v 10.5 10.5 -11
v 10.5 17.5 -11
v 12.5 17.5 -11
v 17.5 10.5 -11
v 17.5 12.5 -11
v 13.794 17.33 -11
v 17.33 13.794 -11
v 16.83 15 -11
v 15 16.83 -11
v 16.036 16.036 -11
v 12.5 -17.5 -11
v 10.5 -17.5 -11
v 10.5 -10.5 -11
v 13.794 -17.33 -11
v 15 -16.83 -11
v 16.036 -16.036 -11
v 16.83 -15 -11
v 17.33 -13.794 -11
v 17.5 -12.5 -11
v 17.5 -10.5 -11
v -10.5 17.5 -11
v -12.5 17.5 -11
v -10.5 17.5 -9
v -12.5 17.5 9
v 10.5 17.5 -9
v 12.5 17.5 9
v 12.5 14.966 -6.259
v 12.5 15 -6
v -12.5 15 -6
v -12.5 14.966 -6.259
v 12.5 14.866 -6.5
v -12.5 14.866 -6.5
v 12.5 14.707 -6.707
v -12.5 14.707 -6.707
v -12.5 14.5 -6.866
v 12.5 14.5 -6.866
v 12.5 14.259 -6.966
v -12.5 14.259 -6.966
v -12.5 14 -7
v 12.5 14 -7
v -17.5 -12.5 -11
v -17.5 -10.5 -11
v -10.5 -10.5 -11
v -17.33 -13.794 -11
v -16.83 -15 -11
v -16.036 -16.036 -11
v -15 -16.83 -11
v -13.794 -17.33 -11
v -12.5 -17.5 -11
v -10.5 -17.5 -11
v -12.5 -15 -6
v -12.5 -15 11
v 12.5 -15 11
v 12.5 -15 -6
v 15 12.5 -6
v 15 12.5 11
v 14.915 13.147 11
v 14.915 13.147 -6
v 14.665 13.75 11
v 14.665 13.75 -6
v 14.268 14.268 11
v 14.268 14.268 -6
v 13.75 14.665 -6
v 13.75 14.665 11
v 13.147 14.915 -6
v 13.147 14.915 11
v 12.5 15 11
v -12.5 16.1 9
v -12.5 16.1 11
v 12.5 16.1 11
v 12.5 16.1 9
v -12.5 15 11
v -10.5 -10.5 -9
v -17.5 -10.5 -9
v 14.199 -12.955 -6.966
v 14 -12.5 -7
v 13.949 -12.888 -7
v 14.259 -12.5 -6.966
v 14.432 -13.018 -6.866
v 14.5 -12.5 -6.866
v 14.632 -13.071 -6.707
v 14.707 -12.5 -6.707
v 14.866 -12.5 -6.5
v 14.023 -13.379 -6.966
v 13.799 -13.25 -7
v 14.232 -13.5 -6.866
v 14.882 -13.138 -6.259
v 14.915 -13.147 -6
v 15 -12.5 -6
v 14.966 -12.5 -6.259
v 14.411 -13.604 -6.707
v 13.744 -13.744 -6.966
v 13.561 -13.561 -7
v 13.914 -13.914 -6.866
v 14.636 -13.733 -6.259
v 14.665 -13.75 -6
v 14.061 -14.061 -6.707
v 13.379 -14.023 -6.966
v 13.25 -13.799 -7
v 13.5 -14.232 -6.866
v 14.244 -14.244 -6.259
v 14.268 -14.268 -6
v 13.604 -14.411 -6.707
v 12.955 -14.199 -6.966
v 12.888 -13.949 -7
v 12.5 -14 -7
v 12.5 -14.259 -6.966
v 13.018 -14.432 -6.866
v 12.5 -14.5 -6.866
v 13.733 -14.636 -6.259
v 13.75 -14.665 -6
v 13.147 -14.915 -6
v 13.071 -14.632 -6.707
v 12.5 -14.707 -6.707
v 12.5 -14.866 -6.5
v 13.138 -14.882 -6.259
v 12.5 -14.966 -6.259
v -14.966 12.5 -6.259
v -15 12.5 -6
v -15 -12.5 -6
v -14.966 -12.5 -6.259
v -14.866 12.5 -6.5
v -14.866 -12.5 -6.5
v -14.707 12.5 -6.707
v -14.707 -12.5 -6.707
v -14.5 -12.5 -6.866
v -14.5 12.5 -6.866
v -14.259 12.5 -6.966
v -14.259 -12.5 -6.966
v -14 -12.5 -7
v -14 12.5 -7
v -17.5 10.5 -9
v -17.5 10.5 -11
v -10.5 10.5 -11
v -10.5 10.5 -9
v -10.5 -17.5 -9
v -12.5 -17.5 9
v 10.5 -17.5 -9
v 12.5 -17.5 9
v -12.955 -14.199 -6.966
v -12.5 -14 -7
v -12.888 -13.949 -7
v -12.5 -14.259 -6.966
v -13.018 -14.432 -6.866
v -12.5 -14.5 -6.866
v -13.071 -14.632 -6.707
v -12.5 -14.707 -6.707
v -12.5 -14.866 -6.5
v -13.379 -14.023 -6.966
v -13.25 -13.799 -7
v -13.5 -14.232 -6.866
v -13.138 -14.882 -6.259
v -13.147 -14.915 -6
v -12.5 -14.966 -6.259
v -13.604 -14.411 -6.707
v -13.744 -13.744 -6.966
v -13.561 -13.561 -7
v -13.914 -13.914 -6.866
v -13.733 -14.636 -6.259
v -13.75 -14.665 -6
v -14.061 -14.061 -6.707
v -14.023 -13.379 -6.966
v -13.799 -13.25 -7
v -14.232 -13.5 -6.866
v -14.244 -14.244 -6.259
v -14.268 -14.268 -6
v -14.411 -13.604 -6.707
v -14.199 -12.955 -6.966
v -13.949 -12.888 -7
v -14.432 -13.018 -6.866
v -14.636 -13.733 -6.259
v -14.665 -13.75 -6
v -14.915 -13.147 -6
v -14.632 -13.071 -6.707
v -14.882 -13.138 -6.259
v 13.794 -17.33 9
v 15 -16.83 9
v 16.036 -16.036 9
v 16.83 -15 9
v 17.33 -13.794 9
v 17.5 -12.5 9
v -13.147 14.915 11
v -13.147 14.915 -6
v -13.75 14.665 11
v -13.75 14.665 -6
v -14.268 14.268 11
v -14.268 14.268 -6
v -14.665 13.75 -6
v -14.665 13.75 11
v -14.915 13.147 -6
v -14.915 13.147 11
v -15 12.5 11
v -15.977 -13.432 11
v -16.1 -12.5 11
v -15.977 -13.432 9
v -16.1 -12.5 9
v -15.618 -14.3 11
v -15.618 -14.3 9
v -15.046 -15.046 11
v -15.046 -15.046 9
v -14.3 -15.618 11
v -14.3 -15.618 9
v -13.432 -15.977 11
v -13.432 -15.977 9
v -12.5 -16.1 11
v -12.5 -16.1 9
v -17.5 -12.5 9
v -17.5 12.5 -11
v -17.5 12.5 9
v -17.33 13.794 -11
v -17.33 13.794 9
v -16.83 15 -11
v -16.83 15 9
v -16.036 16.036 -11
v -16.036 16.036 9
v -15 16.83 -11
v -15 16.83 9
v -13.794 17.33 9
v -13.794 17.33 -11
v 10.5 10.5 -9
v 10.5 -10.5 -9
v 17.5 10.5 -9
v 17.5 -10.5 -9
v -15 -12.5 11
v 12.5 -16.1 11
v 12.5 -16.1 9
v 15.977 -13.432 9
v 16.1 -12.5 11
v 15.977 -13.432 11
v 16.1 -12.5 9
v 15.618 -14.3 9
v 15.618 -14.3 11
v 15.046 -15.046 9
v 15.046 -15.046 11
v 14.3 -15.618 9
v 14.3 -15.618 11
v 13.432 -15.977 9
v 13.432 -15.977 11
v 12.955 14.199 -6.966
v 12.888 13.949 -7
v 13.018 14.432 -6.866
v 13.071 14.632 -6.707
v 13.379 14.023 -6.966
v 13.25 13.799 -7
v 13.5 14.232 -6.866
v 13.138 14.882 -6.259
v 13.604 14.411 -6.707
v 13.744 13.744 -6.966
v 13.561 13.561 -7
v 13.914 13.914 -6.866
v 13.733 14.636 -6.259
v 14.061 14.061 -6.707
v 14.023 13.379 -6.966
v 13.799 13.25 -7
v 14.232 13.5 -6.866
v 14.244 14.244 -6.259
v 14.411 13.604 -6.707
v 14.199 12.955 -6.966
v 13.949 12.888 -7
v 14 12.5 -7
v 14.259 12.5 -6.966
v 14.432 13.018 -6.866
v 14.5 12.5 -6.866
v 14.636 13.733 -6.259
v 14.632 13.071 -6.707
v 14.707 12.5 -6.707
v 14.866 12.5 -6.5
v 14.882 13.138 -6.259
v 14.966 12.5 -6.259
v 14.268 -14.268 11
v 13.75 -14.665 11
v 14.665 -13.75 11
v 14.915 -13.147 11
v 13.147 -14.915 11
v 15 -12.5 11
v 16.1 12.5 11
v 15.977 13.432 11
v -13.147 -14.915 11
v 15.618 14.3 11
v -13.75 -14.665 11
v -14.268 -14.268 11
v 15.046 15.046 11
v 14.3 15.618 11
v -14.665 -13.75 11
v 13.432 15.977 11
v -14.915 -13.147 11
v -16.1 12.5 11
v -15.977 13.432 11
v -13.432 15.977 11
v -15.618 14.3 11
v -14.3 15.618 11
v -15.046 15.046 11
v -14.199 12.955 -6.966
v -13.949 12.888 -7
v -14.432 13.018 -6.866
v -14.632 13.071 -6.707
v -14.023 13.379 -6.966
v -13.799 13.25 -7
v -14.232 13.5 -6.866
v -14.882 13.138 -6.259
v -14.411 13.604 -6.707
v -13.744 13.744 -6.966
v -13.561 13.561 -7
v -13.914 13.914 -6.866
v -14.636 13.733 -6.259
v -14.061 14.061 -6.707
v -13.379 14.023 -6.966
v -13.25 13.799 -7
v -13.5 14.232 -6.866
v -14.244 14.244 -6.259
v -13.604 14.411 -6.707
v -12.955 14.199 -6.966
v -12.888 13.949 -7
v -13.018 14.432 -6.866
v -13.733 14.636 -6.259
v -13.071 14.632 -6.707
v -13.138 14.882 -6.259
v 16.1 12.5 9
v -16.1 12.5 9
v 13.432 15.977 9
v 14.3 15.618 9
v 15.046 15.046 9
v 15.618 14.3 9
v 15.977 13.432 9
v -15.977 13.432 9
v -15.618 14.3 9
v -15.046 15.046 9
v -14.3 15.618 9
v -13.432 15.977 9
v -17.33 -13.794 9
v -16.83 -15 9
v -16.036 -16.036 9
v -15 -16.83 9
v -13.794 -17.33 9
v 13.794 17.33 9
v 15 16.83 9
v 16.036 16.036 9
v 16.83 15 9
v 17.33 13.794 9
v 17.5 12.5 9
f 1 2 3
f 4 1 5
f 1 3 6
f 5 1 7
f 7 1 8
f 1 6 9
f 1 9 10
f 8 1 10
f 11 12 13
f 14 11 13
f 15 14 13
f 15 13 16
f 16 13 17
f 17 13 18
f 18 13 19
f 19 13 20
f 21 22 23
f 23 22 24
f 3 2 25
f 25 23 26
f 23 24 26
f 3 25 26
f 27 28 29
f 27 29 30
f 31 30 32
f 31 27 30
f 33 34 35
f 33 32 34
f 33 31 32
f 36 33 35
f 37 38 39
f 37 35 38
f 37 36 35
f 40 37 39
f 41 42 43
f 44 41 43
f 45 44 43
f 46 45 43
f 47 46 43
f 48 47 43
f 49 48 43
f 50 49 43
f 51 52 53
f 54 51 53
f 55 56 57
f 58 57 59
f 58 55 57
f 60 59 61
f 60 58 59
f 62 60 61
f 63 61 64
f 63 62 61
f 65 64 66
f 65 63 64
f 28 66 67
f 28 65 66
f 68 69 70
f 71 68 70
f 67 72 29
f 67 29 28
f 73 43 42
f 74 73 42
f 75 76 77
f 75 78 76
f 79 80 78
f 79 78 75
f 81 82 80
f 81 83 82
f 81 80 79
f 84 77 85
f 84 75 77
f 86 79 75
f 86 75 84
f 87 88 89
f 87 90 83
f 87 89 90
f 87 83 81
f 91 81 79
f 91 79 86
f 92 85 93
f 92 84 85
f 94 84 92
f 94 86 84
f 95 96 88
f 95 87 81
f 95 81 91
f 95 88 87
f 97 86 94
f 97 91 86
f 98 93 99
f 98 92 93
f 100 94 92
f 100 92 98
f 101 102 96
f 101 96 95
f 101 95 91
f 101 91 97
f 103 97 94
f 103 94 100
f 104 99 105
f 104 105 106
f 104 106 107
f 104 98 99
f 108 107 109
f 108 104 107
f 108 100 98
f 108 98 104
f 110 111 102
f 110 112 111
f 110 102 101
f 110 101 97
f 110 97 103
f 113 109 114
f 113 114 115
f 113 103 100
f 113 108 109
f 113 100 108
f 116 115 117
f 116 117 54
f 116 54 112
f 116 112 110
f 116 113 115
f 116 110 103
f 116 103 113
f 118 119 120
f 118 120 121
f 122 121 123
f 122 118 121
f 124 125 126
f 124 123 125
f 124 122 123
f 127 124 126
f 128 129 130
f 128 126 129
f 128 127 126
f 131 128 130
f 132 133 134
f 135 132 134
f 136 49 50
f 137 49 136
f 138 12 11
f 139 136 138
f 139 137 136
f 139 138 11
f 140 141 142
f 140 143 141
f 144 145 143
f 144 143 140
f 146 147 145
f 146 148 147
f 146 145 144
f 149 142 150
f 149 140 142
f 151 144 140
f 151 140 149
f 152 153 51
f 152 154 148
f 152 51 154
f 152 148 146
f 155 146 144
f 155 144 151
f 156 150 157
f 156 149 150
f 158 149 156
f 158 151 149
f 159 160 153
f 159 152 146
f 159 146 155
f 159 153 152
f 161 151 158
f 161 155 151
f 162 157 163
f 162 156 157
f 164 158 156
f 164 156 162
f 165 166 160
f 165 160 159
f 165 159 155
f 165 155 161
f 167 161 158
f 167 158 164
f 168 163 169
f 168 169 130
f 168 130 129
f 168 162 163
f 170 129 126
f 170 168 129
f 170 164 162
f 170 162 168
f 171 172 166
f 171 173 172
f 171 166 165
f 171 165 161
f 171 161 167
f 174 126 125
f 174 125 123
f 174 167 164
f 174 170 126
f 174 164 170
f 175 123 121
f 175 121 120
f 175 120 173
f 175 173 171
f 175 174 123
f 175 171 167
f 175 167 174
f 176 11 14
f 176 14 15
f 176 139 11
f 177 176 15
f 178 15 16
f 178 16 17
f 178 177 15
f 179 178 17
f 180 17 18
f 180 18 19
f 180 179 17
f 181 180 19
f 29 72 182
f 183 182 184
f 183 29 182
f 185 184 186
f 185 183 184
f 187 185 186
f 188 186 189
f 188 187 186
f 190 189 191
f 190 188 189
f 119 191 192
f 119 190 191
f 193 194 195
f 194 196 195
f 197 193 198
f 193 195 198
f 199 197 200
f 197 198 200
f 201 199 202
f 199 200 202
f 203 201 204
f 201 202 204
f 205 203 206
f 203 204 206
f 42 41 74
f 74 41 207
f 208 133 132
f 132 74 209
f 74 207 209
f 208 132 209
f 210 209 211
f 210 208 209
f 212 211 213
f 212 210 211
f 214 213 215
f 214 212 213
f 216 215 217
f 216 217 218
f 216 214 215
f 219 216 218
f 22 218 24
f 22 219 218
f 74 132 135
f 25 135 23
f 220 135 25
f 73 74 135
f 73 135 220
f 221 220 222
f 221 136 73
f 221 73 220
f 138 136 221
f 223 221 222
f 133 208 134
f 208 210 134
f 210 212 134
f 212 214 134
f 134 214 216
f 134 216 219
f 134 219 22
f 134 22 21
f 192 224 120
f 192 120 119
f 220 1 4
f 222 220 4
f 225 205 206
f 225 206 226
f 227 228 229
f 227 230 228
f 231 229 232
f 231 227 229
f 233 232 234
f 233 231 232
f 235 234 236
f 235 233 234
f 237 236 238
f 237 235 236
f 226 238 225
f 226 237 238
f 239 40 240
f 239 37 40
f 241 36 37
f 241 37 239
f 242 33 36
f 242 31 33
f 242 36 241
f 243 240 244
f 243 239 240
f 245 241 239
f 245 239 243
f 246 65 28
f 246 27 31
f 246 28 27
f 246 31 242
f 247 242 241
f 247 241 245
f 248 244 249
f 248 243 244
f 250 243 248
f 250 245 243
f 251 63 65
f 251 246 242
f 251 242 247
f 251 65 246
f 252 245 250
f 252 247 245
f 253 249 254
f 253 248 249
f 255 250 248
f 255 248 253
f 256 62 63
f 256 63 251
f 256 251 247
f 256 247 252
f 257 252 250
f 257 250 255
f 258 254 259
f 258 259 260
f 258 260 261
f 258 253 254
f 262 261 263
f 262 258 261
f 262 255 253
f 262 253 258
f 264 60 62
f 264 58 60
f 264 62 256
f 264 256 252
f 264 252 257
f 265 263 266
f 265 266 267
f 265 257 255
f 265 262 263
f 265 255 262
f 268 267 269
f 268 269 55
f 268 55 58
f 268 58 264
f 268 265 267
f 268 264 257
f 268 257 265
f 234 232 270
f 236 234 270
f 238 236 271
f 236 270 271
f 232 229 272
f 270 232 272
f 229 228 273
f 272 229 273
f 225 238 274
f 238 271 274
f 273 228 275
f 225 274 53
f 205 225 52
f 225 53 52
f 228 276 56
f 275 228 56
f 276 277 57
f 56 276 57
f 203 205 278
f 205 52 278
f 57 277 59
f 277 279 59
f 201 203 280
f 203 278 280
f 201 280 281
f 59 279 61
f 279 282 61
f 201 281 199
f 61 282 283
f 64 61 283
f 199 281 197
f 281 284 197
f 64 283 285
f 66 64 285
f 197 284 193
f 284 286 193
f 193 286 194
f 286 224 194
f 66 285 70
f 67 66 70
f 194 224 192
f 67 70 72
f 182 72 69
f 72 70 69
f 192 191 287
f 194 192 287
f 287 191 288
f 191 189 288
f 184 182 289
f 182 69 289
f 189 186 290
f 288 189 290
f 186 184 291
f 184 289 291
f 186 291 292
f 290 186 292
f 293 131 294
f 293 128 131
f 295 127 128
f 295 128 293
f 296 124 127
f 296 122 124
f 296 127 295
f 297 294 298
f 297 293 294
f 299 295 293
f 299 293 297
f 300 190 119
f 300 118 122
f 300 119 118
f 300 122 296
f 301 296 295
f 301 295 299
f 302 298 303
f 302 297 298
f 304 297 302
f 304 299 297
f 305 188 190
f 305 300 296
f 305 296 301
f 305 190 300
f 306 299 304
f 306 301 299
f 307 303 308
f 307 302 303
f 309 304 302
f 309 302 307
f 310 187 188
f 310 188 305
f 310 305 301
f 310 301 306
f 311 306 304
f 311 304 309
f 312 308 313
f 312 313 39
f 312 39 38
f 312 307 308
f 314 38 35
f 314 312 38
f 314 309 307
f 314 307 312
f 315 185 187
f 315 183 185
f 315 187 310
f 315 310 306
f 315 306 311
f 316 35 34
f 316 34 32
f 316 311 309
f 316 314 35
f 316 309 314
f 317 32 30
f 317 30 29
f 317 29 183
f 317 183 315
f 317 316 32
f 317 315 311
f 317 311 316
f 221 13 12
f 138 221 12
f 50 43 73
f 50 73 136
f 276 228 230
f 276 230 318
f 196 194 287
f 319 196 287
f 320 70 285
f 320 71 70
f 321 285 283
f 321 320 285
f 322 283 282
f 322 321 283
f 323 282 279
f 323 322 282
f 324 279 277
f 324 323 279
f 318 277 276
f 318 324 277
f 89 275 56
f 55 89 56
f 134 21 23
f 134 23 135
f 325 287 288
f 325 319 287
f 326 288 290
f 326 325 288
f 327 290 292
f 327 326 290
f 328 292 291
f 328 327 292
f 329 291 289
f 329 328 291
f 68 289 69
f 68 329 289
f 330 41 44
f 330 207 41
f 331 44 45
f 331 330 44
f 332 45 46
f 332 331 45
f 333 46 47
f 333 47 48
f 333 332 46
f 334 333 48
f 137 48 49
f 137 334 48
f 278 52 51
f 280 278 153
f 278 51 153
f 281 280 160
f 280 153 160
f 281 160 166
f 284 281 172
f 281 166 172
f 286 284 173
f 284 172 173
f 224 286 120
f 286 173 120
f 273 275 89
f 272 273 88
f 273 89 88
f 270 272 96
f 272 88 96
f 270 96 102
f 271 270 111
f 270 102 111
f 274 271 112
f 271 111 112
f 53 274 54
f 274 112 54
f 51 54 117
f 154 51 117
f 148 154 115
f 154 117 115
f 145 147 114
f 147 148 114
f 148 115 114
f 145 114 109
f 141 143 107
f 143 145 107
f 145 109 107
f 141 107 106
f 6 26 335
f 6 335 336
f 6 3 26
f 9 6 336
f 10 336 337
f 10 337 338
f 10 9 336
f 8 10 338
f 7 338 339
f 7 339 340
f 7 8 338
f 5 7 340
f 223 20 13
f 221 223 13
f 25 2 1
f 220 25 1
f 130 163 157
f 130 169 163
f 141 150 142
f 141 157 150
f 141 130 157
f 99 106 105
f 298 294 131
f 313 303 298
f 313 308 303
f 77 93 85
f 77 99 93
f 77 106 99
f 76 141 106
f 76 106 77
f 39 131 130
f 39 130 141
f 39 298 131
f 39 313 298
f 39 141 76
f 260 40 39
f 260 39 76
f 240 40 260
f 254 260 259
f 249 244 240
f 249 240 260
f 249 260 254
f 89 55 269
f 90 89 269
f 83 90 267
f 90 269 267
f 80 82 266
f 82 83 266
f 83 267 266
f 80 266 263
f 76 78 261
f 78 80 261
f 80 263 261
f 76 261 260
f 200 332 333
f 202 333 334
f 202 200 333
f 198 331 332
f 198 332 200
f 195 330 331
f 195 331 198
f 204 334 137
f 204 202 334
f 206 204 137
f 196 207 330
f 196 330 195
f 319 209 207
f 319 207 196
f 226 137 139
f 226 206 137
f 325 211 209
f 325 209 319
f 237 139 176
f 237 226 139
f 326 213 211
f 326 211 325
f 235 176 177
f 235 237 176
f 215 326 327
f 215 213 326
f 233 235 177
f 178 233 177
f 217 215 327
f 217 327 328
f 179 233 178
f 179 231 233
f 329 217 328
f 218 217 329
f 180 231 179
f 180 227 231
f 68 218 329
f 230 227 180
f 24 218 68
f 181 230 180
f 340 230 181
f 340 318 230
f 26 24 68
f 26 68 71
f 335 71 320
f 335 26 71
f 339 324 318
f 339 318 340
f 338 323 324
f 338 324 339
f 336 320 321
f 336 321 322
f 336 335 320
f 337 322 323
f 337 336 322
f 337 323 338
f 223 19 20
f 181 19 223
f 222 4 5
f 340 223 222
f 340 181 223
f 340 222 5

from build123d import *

# Parameters (mm, degrees)
F0_W         = 35
F0_H         = 35
F1_DEPTH     = 11
F2_W         = 21
F2_H         = 7
F2_W_2       = 7
F2_H_2       = 21
F3_DEPTH     = 2
F4_W         = 35
F4_H         = 35
F4_W_2       = 32.2
F4_H_2       = 32.2
F5_DEPTH     = 2
F6_W         = 30
F6_H         = 30
F7_DEPTH     = 18
F8_R         = 1
F9_T1_DEPTH  = 18
F9_T4_ANGLE  = 90
F9_T6_ANGLE  = 90
F9_T8_ANGLE  = 90
F9_T10_ANGLE = 90
F10_R        = 3.6
F11_R        = 5


# Not quite as in the source:
# - a fillet or chamfer that OpenCascade refuses, or shapes differently, is made with other operations: its cross-section is extruded or revolved along the edge and cut away or added


with BuildPart() as f1:
    # F0 (on Top) → F1 (new body, symmetric)
    with BuildSketch(Plane.XY):
        Rectangle(F0_W, F0_H)
    extrude(amount=F1_DEPTH, both=True)

    # F2 (on face) → F3 (cut)
    with BuildSketch(Plane(origin=(0, 0, -11), x_dir=(1, 0, 0), z_dir=(0, 0, -1))):
        with Locations((0, -14)):
            Rectangle(F2_W, F2_H)
        with Locations((-14, 0)):
            Rectangle(F2_W_2, F2_H_2)
        Rectangle(F2_W, F2_H_2)
        with Locations((14, 0)):
            Rectangle(F2_W_2, F2_H_2)
        with Locations((0, 14)):
            Rectangle(F2_W, F2_H)
    extrude(amount=-F3_DEPTH, mode=Mode.SUBTRACT)

    # F4 (on face) → F5 (cut)
    with BuildSketch(Plane.XY.offset(11)):
        Rectangle(F4_W, F4_H)
        Rectangle(F4_W_2, F4_H_2, mode=Mode.SUBTRACT)
    extrude(amount=-F5_DEPTH, mode=Mode.SUBTRACT)

    # F6 (on face) → F7 (cut)
    with BuildSketch(Plane.XY.offset(11)):
        Rectangle(F6_W, F6_H)
    extrude(amount=-F7_DEPTH, mode=Mode.SUBTRACT)

    # F8
    f8_edges = [f1.edges().sort_by_distance(p)[0] for p in [
        (0, 15, -7),
        (-15, 0, -7),
        (0, -15, -7),
        (15, 0, -7),
    ]]
    fillet(f8_edges, radius=F8_R)

    # F9: fillet of radius 2.5 on 4 edges, made by hand

    # F9_s2 → F9_t1 (join)
    with BuildSketch(Plane.XY.offset(-7)):
        with BuildLine():
            ThreePointArc((-12.5, 15), (-14.267766953, 14.267766953), (-15, 12.5))
            Line((-15, 12.5), (-15, 15))
            Line((-15, 15), (-12.5, 15))
        make_face()
        with BuildLine():
            ThreePointArc((15, -12.5), (14.267766953, -14.267766953), (12.5, -15))
            Line((12.5, -15), (15, -15))
            Line((15, -15), (15, -12.5))
        make_face()
        with BuildLine():
            ThreePointArc((15, 12.5), (14.267766953, 14.267766953), (12.5, 15))
            Line((12.5, 15), (15, 15))
            Line((15, 15), (15, 12.5))
        make_face()
        with BuildLine():
            ThreePointArc((-12.5, -15), (-14.267766953, -14.267766953), (-15, -12.5))
            Line((-15, -12.5), (-15, -15))
            Line((-15, -15), (-12.5, -15))
        make_face()
    extrude(amount=F9_T1_DEPTH)

    # F9_s3 → F9_t4 (revolve)
    with BuildSketch(Plane.YZ.offset(-12.5)):
        with BuildLine():
            ThreePointArc((-14, -7), (-14.7071067812, -6.7071067812), (-15, -6))
            Line((-15, -6), (-15, -7))
            Line((-15, -7), (-14, -7))
        make_face()
    revolve(axis=Axis((-12.5, -12.5, -7), (0, 0, -1)), revolution_arc=F9_T4_ANGLE)

    # F9_s5 → F9_t6 (revolve)
    with BuildSketch(Plane.YZ.offset(12.5)):
        with BuildLine():
            ThreePointArc((14, -7), (14.7071067812, -6.7071067812), (15, -6))
            Line((15, -6), (15, -7))
            Line((15, -7), (14, -7))
        make_face()
    revolve(axis=Axis((12.5, 12.5, -7), (0, 0, -1)), revolution_arc=F9_T6_ANGLE)

    # F9_s7 → F9_t8 (revolve)
    with BuildSketch(Plane.XZ.offset(12.5)):
        with BuildLine():
            ThreePointArc((14, -7), (14.7071067812, -6.7071067812), (15, -6))
            Line((15, -6), (15, -7))
            Line((15, -7), (14, -7))
        make_face()
    revolve(axis=Axis((12.5, -12.5, -7), (0, 0, -1)), revolution_arc=F9_T8_ANGLE)

    # F9_s9 → F9_t10 (revolve)
    with BuildSketch(Plane.XZ.offset(-12.5)):
        with BuildLine():
            ThreePointArc((-14, -7), (-14.7071067812, -6.7071067812), (-15, -6))
            Line((-15, -6), (-15, -7))
            Line((-15, -7), (-14, -7))
        make_face()
    revolve(axis=Axis((-12.5, 12.5, -7), (0, 0, -1)), revolution_arc=F9_T10_ANGLE)

    # F10
    f10_edges = [f1.edges().sort_by_distance(p)[0] for p in [
        (-16.1, -16.1, 10),
        (16.1, -16.1, 10),
        (16.1, 16.1, 10),
        (-16.1, 16.1, 10),
    ]]
    fillet(f10_edges, radius=F10_R)

    # F11
    f11_edges = [f1.edges().sort_by_distance(p)[0] for p in [
        (-17.5, -17.5, -1),
        (17.5, -17.5, -1),
        (17.5, 17.5, -1),
        (-17.5, 17.5, -1),
    ]]
    fillet(f11_edges, radius=F11_R)


solid = f1.part
